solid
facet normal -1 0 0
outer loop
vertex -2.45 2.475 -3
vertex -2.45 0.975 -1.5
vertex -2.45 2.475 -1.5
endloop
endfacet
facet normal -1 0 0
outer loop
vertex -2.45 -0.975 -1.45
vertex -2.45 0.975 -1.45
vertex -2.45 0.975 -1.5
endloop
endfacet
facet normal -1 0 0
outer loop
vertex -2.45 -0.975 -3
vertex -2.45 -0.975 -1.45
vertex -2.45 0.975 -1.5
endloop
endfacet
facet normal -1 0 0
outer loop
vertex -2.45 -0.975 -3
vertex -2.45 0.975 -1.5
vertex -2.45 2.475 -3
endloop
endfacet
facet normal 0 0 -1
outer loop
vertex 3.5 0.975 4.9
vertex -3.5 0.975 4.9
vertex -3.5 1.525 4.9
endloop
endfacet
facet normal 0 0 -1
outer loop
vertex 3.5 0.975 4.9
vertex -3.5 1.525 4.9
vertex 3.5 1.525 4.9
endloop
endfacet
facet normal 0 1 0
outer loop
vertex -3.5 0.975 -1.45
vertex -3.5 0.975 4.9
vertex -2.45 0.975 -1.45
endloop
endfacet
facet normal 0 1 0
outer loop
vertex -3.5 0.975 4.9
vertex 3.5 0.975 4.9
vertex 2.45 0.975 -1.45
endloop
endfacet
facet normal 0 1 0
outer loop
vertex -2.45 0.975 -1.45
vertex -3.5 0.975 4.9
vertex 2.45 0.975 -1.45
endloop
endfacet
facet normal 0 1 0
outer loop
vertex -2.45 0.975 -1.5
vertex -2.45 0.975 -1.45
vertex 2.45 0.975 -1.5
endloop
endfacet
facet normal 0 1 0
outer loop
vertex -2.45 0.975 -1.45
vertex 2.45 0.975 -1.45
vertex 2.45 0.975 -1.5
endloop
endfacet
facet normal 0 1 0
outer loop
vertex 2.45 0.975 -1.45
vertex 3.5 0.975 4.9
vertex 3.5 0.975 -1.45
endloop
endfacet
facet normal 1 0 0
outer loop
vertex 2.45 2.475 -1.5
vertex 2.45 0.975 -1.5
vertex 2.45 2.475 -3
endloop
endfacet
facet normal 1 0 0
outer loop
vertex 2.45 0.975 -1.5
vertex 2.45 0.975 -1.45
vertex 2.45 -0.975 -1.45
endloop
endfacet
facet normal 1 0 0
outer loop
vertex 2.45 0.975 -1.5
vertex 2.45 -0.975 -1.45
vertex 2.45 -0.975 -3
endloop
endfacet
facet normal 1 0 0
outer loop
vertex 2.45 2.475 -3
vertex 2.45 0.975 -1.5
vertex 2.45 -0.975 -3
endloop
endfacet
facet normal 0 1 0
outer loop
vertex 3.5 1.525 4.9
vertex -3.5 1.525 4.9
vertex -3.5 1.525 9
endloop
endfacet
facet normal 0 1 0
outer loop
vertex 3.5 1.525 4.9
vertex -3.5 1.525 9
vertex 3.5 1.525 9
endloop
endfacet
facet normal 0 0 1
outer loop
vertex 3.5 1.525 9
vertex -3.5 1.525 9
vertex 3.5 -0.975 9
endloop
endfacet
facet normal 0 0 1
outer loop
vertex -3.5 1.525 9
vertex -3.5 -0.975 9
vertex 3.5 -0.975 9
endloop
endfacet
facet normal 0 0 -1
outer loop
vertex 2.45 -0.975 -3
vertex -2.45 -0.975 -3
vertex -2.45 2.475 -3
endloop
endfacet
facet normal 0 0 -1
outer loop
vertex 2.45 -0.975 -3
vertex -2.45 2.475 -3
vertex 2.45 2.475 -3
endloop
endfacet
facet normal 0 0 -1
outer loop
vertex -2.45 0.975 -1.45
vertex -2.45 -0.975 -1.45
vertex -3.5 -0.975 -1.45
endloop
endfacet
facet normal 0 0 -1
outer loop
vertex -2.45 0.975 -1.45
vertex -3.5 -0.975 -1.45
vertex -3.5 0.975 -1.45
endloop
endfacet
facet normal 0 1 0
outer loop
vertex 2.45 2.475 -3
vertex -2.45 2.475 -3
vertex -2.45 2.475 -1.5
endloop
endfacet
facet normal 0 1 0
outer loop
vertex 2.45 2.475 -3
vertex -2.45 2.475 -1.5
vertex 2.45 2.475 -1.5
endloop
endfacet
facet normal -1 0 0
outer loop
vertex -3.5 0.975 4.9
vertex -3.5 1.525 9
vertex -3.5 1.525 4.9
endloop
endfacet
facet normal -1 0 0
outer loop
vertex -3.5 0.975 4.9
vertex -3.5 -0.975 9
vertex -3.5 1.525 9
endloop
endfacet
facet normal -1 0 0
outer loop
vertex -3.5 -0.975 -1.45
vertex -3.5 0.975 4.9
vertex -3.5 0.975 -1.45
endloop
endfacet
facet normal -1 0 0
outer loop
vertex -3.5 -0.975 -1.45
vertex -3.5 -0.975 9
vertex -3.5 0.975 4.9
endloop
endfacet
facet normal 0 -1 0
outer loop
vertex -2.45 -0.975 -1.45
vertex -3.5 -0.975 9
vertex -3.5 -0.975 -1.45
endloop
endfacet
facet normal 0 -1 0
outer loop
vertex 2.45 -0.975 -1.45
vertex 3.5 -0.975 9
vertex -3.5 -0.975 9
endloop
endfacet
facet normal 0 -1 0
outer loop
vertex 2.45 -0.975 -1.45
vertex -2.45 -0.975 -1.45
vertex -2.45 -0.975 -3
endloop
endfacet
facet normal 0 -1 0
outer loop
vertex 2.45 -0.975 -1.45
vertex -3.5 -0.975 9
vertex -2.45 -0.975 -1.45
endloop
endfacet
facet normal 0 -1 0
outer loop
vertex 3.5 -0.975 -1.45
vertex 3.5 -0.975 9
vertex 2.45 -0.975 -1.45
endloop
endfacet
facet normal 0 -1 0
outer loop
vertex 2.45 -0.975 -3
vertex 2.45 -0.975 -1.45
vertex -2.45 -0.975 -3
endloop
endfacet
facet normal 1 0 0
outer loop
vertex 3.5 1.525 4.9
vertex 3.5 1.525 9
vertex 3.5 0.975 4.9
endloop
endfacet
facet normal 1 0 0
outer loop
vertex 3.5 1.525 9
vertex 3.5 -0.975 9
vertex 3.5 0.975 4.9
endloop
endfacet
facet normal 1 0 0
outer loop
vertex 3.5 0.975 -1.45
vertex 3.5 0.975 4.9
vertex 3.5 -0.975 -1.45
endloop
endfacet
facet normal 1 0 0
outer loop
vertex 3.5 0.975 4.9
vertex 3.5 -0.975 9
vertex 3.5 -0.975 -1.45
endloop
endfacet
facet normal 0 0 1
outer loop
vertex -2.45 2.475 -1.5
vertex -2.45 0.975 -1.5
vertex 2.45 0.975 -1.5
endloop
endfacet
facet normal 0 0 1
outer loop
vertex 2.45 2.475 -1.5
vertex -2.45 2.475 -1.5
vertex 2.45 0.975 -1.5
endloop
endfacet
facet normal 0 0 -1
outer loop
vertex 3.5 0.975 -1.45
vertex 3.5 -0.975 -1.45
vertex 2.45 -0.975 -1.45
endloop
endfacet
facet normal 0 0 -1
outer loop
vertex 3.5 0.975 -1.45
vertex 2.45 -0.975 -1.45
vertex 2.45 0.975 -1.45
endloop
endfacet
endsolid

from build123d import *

# Parameters (mm, degrees)
BOSS_EXTRUDE1_DEPTH      = 9
BOSS_EXTRUDE1_DEPTH_BACK = 3
SKETCH1_W                = 4.9
SKETCH1_H                = 1.95
SKETCH2_W                = 4.9
SKETCH2_H                = 1.5
BOSS_EXTRUDE2_DEPTH      = 1.5
SKETCH3_W                = 10.45
SKETCH3_H                = 1.95
BOSS_EXTRUDE3_DEPTH      = 3.5
SKETCH4_W                = 7
SKETCH4_H                = 4.1
BOSS_EXTRUDE4_DEPTH      = 0.55


with BuildPart() as part:
    # Sketch1 → Boss-Extrude1 (new, two sides: drawn at the far end of the back side and taken through both)
    with BuildSketch(Plane.XY.offset(-BOSS_EXTRUDE1_DEPTH_BACK)):
        Rectangle(SKETCH1_W, SKETCH1_H)
    extrude(amount=BOSS_EXTRUDE1_DEPTH + BOSS_EXTRUDE1_DEPTH_BACK)

    # Sketch2 → Boss-Extrude2 (add)
    with BuildSketch(Plane(origin=(0, 0.975, 0), x_dir=(1, 0, 0), z_dir=(0, 1, 0))):
        with Locations((0, 2.25)):
            Rectangle(SKETCH2_W, SKETCH2_H)
    extrude(amount=BOSS_EXTRUDE2_DEPTH)

    # Sketch3 → Boss-Extrude3 (add, symmetric)
    with BuildSketch(Plane(origin=(0, 0, 0), x_dir=(0, 0, -1), z_dir=(1, 0, 0))):
        with Locations((-3.775, 0)):
            Rectangle(SKETCH3_W, SKETCH3_H)
    extrude(amount=BOSS_EXTRUDE3_DEPTH, both=True)

    # Sketch4 → Boss-Extrude4 (add)
    with BuildSketch(Plane(origin=(0, 0.975, 0), x_dir=(1, 0, 0), z_dir=(0, 1, 0))):
        with Locations((0, -6.95)):
            Rectangle(SKETCH4_W, SKETCH4_H)
    extrude(amount=BOSS_EXTRUDE4_DEPTH)


solid = part.part
